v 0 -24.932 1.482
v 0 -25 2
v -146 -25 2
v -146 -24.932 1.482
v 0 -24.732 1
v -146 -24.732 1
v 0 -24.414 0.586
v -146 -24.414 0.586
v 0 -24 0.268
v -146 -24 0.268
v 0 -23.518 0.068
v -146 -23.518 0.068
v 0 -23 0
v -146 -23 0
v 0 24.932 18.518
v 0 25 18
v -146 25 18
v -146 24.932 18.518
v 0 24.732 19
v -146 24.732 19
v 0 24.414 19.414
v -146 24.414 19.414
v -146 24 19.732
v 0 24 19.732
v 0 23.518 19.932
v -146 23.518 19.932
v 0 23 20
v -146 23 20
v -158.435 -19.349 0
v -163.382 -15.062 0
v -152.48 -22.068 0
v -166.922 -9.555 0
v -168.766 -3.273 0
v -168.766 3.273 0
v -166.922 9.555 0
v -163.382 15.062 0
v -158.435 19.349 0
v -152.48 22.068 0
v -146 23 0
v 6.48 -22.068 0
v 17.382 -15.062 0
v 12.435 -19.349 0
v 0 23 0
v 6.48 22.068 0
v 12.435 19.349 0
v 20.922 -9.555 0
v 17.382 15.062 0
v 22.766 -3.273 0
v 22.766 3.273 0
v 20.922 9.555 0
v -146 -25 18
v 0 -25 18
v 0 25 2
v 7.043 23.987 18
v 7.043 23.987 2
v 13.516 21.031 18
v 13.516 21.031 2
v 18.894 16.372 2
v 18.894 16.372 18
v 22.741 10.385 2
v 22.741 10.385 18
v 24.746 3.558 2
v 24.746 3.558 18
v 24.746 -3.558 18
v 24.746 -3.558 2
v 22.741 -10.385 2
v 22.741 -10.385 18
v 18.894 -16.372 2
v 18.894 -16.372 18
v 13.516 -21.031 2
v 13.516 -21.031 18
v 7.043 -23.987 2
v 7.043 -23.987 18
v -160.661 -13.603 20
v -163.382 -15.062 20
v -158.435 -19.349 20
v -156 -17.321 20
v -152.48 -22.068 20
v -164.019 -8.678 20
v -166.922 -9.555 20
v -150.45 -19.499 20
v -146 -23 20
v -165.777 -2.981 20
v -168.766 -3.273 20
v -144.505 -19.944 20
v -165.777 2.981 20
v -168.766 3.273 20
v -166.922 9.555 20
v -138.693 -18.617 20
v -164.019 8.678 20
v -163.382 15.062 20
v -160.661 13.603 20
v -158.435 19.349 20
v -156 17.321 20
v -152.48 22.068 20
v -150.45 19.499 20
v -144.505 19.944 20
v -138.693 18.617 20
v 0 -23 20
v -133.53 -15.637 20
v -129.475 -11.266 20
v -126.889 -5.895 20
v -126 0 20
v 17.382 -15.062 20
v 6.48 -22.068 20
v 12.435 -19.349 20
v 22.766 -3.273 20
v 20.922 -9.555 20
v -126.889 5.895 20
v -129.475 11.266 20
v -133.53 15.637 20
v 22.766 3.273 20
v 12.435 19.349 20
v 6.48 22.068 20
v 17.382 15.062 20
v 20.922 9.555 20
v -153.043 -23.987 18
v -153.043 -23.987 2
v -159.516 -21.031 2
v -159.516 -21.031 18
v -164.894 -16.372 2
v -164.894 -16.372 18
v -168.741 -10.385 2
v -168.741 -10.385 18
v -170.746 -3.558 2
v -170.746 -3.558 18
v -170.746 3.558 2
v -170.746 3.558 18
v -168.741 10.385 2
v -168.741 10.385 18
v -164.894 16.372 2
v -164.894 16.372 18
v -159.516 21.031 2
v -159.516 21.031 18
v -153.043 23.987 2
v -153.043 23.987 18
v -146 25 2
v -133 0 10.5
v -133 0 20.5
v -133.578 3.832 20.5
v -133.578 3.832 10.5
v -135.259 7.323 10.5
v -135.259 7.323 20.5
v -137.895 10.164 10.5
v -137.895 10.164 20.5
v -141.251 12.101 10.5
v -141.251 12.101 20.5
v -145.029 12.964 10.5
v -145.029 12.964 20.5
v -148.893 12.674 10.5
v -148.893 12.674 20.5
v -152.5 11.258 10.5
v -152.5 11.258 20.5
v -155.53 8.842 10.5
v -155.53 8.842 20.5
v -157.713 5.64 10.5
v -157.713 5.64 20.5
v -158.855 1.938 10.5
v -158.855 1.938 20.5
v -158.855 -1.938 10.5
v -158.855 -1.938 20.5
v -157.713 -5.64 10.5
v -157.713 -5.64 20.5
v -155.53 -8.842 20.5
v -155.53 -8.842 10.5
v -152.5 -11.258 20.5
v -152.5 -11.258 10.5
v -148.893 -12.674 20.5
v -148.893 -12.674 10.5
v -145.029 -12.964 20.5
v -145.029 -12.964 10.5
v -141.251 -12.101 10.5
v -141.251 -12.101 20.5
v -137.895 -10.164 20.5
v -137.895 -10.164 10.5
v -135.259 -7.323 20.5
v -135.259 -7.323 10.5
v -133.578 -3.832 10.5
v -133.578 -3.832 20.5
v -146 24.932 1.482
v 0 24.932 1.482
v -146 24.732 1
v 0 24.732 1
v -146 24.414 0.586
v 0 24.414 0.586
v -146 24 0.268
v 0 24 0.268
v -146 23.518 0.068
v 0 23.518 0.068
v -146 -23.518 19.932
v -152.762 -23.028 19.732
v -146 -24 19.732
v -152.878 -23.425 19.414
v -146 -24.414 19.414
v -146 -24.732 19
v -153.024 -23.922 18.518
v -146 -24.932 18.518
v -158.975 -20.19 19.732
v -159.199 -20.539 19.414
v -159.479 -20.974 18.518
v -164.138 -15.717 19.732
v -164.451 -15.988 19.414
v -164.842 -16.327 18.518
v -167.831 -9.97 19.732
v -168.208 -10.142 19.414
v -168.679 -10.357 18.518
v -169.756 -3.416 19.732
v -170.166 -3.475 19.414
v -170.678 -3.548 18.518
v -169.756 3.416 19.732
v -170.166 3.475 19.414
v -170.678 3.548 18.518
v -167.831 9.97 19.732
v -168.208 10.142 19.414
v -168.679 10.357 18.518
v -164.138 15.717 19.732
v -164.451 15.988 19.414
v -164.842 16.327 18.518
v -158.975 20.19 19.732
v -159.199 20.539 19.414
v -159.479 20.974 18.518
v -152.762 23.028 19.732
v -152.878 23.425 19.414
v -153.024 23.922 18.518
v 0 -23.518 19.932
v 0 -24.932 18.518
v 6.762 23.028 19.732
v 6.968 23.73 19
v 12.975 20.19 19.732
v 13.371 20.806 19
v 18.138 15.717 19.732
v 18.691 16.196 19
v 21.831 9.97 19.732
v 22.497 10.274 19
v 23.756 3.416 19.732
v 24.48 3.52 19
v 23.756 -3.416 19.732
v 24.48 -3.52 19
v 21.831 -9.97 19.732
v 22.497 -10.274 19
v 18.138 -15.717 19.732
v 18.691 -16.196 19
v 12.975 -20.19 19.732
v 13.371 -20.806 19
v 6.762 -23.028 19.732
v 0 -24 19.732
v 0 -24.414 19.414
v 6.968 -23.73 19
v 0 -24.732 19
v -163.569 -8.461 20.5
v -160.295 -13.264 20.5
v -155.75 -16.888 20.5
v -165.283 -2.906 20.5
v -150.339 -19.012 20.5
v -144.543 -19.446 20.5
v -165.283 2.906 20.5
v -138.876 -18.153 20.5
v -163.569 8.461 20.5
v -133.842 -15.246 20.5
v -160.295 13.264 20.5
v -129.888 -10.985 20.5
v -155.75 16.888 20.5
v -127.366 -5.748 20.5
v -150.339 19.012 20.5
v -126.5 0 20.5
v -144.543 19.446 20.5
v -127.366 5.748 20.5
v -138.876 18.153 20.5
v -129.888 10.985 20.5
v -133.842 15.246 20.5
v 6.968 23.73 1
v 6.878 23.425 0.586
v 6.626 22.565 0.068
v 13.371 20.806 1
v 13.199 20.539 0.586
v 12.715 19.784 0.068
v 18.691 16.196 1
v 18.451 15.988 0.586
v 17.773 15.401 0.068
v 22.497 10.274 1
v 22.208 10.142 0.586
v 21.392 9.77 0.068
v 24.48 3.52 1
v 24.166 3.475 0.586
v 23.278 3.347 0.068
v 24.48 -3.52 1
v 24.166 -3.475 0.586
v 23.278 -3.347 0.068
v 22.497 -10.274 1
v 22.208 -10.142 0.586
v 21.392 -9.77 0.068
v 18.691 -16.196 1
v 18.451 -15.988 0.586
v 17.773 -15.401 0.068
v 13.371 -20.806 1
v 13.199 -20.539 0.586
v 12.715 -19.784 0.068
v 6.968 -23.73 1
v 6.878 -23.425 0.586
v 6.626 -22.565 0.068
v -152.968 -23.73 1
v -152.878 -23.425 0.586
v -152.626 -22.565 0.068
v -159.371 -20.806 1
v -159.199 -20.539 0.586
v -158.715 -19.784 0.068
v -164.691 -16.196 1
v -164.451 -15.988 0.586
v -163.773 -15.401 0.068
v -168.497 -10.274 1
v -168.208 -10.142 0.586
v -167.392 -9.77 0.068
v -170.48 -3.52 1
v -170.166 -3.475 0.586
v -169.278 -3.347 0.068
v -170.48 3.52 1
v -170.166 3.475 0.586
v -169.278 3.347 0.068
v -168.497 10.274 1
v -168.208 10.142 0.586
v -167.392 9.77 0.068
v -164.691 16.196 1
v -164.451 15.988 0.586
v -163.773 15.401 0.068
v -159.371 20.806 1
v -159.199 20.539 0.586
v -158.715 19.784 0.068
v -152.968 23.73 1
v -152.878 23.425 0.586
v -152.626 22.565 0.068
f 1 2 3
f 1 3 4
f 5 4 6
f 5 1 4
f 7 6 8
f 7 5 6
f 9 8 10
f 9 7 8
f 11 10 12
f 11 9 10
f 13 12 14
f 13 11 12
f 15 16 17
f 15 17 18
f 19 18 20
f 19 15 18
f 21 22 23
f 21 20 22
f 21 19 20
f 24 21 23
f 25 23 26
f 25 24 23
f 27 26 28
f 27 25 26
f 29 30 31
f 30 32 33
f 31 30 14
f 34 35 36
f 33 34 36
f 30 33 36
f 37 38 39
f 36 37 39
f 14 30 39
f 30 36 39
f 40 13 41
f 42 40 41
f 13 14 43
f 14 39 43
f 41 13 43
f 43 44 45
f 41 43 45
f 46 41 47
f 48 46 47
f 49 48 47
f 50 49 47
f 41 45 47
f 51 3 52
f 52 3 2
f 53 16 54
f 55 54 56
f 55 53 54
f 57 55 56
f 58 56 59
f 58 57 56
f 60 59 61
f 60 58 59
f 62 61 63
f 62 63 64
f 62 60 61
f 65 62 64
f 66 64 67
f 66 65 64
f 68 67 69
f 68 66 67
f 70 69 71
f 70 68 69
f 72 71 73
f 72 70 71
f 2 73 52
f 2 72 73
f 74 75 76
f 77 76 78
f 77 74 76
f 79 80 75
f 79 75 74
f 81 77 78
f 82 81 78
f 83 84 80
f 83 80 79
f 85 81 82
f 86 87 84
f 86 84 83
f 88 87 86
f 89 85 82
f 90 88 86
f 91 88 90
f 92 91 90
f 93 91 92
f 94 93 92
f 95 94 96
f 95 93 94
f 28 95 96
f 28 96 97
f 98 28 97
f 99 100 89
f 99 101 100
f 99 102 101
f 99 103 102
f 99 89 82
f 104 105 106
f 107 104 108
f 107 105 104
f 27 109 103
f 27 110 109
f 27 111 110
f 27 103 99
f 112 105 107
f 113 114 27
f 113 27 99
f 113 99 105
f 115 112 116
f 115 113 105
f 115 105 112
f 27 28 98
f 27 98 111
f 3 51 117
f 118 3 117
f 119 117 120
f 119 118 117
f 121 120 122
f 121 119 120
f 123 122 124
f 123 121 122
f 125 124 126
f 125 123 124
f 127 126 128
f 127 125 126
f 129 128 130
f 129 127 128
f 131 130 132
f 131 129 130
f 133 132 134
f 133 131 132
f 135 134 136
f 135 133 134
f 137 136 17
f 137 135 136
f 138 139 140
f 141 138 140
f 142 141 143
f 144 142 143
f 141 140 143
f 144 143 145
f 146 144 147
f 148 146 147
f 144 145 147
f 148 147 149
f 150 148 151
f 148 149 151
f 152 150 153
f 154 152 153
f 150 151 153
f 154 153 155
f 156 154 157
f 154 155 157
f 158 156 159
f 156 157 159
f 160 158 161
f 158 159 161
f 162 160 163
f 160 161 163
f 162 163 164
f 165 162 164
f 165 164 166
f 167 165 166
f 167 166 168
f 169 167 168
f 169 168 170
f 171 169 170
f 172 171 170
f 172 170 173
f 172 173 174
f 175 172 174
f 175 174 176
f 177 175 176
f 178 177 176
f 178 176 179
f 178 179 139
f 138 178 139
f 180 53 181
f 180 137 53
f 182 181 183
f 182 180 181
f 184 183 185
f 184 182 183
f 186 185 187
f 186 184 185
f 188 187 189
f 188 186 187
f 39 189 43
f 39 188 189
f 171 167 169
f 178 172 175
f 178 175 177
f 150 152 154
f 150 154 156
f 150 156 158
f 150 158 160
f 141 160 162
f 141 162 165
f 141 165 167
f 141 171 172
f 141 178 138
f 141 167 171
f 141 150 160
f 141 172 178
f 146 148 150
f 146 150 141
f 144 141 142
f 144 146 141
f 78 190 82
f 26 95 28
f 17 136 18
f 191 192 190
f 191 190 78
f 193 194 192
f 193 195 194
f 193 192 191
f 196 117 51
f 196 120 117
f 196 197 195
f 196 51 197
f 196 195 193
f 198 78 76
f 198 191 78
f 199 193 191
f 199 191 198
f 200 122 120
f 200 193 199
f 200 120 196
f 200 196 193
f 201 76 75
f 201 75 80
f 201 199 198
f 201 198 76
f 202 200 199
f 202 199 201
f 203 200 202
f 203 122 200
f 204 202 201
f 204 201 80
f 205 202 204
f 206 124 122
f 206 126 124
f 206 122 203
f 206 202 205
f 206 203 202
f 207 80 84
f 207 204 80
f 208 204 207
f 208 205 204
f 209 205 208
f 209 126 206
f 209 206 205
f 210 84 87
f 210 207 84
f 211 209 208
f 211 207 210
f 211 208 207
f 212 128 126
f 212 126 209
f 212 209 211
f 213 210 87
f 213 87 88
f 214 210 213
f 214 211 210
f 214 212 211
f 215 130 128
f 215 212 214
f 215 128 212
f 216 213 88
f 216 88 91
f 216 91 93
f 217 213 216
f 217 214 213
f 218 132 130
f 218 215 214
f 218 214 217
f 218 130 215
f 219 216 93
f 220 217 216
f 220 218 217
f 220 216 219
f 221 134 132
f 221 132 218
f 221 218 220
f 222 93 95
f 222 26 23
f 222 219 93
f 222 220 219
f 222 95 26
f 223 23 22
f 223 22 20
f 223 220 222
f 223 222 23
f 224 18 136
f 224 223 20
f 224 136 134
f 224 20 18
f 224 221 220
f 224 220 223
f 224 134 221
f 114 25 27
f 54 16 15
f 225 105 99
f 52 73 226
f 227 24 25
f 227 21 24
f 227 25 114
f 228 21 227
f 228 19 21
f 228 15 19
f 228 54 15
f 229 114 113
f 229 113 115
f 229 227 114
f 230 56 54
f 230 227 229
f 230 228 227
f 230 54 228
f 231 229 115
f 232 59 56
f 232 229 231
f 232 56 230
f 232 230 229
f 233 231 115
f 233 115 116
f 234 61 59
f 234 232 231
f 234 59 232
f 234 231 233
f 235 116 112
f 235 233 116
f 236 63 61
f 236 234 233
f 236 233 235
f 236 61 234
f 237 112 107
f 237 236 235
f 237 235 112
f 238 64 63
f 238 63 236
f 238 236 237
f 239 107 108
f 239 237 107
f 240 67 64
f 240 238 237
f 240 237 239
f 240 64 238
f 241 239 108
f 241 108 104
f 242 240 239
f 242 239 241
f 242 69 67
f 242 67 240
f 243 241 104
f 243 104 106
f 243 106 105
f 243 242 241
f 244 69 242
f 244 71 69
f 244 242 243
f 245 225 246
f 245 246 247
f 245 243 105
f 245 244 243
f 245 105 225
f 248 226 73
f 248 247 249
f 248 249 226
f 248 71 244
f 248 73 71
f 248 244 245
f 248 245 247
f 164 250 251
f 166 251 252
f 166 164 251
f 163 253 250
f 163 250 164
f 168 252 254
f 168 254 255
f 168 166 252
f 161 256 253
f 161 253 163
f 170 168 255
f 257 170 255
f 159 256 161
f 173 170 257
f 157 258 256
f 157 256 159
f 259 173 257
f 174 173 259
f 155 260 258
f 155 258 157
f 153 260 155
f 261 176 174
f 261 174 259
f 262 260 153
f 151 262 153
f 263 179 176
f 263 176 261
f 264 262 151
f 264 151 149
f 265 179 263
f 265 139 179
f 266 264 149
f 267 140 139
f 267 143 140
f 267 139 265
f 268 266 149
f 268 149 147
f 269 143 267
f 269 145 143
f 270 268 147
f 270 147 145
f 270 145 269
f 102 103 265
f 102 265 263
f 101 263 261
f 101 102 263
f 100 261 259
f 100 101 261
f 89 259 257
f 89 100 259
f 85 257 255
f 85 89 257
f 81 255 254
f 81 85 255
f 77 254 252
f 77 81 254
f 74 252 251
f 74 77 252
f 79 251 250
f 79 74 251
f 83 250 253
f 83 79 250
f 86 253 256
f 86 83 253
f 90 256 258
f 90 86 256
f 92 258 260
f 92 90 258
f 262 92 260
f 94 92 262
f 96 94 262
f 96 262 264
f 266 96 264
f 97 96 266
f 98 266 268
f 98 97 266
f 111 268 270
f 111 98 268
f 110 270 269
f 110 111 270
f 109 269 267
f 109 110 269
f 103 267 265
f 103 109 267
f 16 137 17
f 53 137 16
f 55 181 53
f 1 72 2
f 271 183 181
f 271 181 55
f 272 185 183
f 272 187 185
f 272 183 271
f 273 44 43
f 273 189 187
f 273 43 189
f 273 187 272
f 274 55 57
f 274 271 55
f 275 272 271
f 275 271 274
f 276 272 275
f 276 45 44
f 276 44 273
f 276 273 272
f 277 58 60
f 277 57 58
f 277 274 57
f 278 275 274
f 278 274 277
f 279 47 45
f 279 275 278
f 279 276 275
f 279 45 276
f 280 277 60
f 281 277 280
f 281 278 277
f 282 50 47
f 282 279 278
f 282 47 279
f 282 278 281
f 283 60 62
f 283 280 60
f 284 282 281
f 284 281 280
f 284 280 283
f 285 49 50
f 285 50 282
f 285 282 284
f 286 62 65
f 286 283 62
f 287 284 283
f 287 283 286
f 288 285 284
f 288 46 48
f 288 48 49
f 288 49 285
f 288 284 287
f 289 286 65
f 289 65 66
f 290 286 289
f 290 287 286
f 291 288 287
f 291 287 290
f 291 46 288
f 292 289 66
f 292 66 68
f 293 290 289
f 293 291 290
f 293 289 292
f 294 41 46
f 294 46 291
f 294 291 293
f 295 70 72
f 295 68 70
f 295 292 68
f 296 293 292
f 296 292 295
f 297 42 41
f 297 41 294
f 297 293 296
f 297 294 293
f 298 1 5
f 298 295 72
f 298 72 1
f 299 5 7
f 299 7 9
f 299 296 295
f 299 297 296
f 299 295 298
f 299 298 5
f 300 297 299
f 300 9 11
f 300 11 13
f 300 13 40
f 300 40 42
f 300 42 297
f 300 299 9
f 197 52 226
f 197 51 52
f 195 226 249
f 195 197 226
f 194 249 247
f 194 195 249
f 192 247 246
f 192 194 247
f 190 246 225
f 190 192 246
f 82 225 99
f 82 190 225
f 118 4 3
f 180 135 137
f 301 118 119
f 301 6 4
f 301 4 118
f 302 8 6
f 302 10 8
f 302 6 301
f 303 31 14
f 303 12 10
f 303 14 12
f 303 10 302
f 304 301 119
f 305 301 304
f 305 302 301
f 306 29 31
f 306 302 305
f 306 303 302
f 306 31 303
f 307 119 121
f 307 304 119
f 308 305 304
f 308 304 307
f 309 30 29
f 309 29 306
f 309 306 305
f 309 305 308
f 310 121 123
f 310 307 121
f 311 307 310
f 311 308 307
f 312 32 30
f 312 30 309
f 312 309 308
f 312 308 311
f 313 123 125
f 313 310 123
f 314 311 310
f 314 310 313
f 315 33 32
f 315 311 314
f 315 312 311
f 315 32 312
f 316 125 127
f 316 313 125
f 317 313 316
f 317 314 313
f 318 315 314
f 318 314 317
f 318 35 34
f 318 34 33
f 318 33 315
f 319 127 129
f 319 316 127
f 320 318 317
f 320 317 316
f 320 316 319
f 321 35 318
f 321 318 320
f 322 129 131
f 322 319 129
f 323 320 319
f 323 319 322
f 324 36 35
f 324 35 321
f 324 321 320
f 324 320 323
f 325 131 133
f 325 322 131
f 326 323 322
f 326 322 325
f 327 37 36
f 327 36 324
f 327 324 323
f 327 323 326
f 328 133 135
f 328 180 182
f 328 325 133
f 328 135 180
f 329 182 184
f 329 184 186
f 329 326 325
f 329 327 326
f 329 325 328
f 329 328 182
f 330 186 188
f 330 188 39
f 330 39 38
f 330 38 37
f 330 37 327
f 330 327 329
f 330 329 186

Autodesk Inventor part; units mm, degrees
ref_plane "YZ Plane" through (0, 0, 0) normal (1, 0, 0) x (0, 1, 0)
ref_plane "XZ Plane" through (0, 0, 0) normal (0, 1, 0) x (-1, 0, 0)
ref_plane "XY Plane" through (0, 0, 0) normal (0, 0, 1) x (1, 0, 0)
sketch "Sketch1" plane through (0, 0, 0) normal (0, 0, 1) x (1, 0, 0)
  circle A0 centre (0, 0) radius 25
  circle A1 centre (-146, 0) radius 25
  line L0 (-146, 25) -> (0, 25)
  line L1 (-146, -25) -> (0, -25)
  point P0 (-171, 0)
  point P1 (25, 0)
  dimension "d0" = 50
  dimension "d1" = 196
extrude "Extrusion1" add sketch "Sketch1" along normal blind 20
sketch "Sketch2" plane through (0, 0, 20) normal (0, 0, 1) x (1, 0, 0)
  arc A0 (0, -25) -> (0, 25) centre (0, 0) ccw projected
  line L0 (0, 25) -> (-146, 25) projected
  arc A1 (-146, 25) -> (-146, -25) centre (-146, 0) ccw projected
  line L1 (-146, -25) -> (0, -25) projected
  circle A2 centre (-146, 0) radius 20
  dimension "d4" = 40
extrude "Extrusion2" add sketch "Sketch2" along normal blind 0.5 contours A2
chamfer "Chamfer1" distance 0.5 angle 45 1 edges at (-166, 0, 20.5)
sketch "Sketch3" plane through (-146, 0, 20.5) normal (0, 0, 1) x (1, 0, 0)
  circle A0 centre (0, 0) radius 20 projected
  arc A1 (146, -25) -> (146, 25) centre (146, 0) ccw projected
  line L0 (146, 25) -> (0, 25) projected
  arc A2 (0, 25) -> (0, -25) centre (0, 0) ccw projected
  line L1 (0, -25) -> (146, -25) projected
  circle A3 centre (0, 0) radius 13
  dimension "d10" = 26
extrude "Extrusion3" cut sketch "Sketch3" against normal blind 10 contours A3
fillet "Fillet1" radius 2 8 edges at (25, 0, 20) (-73, 25, 20) (-171, 0, 20) (-73, -25, 20) (25, 0, 0) (-73, 25, 0) (-171, 0, 0) (-73, -25, 0)
properties part number "HMI arm bewegende deel" material "Steel"
